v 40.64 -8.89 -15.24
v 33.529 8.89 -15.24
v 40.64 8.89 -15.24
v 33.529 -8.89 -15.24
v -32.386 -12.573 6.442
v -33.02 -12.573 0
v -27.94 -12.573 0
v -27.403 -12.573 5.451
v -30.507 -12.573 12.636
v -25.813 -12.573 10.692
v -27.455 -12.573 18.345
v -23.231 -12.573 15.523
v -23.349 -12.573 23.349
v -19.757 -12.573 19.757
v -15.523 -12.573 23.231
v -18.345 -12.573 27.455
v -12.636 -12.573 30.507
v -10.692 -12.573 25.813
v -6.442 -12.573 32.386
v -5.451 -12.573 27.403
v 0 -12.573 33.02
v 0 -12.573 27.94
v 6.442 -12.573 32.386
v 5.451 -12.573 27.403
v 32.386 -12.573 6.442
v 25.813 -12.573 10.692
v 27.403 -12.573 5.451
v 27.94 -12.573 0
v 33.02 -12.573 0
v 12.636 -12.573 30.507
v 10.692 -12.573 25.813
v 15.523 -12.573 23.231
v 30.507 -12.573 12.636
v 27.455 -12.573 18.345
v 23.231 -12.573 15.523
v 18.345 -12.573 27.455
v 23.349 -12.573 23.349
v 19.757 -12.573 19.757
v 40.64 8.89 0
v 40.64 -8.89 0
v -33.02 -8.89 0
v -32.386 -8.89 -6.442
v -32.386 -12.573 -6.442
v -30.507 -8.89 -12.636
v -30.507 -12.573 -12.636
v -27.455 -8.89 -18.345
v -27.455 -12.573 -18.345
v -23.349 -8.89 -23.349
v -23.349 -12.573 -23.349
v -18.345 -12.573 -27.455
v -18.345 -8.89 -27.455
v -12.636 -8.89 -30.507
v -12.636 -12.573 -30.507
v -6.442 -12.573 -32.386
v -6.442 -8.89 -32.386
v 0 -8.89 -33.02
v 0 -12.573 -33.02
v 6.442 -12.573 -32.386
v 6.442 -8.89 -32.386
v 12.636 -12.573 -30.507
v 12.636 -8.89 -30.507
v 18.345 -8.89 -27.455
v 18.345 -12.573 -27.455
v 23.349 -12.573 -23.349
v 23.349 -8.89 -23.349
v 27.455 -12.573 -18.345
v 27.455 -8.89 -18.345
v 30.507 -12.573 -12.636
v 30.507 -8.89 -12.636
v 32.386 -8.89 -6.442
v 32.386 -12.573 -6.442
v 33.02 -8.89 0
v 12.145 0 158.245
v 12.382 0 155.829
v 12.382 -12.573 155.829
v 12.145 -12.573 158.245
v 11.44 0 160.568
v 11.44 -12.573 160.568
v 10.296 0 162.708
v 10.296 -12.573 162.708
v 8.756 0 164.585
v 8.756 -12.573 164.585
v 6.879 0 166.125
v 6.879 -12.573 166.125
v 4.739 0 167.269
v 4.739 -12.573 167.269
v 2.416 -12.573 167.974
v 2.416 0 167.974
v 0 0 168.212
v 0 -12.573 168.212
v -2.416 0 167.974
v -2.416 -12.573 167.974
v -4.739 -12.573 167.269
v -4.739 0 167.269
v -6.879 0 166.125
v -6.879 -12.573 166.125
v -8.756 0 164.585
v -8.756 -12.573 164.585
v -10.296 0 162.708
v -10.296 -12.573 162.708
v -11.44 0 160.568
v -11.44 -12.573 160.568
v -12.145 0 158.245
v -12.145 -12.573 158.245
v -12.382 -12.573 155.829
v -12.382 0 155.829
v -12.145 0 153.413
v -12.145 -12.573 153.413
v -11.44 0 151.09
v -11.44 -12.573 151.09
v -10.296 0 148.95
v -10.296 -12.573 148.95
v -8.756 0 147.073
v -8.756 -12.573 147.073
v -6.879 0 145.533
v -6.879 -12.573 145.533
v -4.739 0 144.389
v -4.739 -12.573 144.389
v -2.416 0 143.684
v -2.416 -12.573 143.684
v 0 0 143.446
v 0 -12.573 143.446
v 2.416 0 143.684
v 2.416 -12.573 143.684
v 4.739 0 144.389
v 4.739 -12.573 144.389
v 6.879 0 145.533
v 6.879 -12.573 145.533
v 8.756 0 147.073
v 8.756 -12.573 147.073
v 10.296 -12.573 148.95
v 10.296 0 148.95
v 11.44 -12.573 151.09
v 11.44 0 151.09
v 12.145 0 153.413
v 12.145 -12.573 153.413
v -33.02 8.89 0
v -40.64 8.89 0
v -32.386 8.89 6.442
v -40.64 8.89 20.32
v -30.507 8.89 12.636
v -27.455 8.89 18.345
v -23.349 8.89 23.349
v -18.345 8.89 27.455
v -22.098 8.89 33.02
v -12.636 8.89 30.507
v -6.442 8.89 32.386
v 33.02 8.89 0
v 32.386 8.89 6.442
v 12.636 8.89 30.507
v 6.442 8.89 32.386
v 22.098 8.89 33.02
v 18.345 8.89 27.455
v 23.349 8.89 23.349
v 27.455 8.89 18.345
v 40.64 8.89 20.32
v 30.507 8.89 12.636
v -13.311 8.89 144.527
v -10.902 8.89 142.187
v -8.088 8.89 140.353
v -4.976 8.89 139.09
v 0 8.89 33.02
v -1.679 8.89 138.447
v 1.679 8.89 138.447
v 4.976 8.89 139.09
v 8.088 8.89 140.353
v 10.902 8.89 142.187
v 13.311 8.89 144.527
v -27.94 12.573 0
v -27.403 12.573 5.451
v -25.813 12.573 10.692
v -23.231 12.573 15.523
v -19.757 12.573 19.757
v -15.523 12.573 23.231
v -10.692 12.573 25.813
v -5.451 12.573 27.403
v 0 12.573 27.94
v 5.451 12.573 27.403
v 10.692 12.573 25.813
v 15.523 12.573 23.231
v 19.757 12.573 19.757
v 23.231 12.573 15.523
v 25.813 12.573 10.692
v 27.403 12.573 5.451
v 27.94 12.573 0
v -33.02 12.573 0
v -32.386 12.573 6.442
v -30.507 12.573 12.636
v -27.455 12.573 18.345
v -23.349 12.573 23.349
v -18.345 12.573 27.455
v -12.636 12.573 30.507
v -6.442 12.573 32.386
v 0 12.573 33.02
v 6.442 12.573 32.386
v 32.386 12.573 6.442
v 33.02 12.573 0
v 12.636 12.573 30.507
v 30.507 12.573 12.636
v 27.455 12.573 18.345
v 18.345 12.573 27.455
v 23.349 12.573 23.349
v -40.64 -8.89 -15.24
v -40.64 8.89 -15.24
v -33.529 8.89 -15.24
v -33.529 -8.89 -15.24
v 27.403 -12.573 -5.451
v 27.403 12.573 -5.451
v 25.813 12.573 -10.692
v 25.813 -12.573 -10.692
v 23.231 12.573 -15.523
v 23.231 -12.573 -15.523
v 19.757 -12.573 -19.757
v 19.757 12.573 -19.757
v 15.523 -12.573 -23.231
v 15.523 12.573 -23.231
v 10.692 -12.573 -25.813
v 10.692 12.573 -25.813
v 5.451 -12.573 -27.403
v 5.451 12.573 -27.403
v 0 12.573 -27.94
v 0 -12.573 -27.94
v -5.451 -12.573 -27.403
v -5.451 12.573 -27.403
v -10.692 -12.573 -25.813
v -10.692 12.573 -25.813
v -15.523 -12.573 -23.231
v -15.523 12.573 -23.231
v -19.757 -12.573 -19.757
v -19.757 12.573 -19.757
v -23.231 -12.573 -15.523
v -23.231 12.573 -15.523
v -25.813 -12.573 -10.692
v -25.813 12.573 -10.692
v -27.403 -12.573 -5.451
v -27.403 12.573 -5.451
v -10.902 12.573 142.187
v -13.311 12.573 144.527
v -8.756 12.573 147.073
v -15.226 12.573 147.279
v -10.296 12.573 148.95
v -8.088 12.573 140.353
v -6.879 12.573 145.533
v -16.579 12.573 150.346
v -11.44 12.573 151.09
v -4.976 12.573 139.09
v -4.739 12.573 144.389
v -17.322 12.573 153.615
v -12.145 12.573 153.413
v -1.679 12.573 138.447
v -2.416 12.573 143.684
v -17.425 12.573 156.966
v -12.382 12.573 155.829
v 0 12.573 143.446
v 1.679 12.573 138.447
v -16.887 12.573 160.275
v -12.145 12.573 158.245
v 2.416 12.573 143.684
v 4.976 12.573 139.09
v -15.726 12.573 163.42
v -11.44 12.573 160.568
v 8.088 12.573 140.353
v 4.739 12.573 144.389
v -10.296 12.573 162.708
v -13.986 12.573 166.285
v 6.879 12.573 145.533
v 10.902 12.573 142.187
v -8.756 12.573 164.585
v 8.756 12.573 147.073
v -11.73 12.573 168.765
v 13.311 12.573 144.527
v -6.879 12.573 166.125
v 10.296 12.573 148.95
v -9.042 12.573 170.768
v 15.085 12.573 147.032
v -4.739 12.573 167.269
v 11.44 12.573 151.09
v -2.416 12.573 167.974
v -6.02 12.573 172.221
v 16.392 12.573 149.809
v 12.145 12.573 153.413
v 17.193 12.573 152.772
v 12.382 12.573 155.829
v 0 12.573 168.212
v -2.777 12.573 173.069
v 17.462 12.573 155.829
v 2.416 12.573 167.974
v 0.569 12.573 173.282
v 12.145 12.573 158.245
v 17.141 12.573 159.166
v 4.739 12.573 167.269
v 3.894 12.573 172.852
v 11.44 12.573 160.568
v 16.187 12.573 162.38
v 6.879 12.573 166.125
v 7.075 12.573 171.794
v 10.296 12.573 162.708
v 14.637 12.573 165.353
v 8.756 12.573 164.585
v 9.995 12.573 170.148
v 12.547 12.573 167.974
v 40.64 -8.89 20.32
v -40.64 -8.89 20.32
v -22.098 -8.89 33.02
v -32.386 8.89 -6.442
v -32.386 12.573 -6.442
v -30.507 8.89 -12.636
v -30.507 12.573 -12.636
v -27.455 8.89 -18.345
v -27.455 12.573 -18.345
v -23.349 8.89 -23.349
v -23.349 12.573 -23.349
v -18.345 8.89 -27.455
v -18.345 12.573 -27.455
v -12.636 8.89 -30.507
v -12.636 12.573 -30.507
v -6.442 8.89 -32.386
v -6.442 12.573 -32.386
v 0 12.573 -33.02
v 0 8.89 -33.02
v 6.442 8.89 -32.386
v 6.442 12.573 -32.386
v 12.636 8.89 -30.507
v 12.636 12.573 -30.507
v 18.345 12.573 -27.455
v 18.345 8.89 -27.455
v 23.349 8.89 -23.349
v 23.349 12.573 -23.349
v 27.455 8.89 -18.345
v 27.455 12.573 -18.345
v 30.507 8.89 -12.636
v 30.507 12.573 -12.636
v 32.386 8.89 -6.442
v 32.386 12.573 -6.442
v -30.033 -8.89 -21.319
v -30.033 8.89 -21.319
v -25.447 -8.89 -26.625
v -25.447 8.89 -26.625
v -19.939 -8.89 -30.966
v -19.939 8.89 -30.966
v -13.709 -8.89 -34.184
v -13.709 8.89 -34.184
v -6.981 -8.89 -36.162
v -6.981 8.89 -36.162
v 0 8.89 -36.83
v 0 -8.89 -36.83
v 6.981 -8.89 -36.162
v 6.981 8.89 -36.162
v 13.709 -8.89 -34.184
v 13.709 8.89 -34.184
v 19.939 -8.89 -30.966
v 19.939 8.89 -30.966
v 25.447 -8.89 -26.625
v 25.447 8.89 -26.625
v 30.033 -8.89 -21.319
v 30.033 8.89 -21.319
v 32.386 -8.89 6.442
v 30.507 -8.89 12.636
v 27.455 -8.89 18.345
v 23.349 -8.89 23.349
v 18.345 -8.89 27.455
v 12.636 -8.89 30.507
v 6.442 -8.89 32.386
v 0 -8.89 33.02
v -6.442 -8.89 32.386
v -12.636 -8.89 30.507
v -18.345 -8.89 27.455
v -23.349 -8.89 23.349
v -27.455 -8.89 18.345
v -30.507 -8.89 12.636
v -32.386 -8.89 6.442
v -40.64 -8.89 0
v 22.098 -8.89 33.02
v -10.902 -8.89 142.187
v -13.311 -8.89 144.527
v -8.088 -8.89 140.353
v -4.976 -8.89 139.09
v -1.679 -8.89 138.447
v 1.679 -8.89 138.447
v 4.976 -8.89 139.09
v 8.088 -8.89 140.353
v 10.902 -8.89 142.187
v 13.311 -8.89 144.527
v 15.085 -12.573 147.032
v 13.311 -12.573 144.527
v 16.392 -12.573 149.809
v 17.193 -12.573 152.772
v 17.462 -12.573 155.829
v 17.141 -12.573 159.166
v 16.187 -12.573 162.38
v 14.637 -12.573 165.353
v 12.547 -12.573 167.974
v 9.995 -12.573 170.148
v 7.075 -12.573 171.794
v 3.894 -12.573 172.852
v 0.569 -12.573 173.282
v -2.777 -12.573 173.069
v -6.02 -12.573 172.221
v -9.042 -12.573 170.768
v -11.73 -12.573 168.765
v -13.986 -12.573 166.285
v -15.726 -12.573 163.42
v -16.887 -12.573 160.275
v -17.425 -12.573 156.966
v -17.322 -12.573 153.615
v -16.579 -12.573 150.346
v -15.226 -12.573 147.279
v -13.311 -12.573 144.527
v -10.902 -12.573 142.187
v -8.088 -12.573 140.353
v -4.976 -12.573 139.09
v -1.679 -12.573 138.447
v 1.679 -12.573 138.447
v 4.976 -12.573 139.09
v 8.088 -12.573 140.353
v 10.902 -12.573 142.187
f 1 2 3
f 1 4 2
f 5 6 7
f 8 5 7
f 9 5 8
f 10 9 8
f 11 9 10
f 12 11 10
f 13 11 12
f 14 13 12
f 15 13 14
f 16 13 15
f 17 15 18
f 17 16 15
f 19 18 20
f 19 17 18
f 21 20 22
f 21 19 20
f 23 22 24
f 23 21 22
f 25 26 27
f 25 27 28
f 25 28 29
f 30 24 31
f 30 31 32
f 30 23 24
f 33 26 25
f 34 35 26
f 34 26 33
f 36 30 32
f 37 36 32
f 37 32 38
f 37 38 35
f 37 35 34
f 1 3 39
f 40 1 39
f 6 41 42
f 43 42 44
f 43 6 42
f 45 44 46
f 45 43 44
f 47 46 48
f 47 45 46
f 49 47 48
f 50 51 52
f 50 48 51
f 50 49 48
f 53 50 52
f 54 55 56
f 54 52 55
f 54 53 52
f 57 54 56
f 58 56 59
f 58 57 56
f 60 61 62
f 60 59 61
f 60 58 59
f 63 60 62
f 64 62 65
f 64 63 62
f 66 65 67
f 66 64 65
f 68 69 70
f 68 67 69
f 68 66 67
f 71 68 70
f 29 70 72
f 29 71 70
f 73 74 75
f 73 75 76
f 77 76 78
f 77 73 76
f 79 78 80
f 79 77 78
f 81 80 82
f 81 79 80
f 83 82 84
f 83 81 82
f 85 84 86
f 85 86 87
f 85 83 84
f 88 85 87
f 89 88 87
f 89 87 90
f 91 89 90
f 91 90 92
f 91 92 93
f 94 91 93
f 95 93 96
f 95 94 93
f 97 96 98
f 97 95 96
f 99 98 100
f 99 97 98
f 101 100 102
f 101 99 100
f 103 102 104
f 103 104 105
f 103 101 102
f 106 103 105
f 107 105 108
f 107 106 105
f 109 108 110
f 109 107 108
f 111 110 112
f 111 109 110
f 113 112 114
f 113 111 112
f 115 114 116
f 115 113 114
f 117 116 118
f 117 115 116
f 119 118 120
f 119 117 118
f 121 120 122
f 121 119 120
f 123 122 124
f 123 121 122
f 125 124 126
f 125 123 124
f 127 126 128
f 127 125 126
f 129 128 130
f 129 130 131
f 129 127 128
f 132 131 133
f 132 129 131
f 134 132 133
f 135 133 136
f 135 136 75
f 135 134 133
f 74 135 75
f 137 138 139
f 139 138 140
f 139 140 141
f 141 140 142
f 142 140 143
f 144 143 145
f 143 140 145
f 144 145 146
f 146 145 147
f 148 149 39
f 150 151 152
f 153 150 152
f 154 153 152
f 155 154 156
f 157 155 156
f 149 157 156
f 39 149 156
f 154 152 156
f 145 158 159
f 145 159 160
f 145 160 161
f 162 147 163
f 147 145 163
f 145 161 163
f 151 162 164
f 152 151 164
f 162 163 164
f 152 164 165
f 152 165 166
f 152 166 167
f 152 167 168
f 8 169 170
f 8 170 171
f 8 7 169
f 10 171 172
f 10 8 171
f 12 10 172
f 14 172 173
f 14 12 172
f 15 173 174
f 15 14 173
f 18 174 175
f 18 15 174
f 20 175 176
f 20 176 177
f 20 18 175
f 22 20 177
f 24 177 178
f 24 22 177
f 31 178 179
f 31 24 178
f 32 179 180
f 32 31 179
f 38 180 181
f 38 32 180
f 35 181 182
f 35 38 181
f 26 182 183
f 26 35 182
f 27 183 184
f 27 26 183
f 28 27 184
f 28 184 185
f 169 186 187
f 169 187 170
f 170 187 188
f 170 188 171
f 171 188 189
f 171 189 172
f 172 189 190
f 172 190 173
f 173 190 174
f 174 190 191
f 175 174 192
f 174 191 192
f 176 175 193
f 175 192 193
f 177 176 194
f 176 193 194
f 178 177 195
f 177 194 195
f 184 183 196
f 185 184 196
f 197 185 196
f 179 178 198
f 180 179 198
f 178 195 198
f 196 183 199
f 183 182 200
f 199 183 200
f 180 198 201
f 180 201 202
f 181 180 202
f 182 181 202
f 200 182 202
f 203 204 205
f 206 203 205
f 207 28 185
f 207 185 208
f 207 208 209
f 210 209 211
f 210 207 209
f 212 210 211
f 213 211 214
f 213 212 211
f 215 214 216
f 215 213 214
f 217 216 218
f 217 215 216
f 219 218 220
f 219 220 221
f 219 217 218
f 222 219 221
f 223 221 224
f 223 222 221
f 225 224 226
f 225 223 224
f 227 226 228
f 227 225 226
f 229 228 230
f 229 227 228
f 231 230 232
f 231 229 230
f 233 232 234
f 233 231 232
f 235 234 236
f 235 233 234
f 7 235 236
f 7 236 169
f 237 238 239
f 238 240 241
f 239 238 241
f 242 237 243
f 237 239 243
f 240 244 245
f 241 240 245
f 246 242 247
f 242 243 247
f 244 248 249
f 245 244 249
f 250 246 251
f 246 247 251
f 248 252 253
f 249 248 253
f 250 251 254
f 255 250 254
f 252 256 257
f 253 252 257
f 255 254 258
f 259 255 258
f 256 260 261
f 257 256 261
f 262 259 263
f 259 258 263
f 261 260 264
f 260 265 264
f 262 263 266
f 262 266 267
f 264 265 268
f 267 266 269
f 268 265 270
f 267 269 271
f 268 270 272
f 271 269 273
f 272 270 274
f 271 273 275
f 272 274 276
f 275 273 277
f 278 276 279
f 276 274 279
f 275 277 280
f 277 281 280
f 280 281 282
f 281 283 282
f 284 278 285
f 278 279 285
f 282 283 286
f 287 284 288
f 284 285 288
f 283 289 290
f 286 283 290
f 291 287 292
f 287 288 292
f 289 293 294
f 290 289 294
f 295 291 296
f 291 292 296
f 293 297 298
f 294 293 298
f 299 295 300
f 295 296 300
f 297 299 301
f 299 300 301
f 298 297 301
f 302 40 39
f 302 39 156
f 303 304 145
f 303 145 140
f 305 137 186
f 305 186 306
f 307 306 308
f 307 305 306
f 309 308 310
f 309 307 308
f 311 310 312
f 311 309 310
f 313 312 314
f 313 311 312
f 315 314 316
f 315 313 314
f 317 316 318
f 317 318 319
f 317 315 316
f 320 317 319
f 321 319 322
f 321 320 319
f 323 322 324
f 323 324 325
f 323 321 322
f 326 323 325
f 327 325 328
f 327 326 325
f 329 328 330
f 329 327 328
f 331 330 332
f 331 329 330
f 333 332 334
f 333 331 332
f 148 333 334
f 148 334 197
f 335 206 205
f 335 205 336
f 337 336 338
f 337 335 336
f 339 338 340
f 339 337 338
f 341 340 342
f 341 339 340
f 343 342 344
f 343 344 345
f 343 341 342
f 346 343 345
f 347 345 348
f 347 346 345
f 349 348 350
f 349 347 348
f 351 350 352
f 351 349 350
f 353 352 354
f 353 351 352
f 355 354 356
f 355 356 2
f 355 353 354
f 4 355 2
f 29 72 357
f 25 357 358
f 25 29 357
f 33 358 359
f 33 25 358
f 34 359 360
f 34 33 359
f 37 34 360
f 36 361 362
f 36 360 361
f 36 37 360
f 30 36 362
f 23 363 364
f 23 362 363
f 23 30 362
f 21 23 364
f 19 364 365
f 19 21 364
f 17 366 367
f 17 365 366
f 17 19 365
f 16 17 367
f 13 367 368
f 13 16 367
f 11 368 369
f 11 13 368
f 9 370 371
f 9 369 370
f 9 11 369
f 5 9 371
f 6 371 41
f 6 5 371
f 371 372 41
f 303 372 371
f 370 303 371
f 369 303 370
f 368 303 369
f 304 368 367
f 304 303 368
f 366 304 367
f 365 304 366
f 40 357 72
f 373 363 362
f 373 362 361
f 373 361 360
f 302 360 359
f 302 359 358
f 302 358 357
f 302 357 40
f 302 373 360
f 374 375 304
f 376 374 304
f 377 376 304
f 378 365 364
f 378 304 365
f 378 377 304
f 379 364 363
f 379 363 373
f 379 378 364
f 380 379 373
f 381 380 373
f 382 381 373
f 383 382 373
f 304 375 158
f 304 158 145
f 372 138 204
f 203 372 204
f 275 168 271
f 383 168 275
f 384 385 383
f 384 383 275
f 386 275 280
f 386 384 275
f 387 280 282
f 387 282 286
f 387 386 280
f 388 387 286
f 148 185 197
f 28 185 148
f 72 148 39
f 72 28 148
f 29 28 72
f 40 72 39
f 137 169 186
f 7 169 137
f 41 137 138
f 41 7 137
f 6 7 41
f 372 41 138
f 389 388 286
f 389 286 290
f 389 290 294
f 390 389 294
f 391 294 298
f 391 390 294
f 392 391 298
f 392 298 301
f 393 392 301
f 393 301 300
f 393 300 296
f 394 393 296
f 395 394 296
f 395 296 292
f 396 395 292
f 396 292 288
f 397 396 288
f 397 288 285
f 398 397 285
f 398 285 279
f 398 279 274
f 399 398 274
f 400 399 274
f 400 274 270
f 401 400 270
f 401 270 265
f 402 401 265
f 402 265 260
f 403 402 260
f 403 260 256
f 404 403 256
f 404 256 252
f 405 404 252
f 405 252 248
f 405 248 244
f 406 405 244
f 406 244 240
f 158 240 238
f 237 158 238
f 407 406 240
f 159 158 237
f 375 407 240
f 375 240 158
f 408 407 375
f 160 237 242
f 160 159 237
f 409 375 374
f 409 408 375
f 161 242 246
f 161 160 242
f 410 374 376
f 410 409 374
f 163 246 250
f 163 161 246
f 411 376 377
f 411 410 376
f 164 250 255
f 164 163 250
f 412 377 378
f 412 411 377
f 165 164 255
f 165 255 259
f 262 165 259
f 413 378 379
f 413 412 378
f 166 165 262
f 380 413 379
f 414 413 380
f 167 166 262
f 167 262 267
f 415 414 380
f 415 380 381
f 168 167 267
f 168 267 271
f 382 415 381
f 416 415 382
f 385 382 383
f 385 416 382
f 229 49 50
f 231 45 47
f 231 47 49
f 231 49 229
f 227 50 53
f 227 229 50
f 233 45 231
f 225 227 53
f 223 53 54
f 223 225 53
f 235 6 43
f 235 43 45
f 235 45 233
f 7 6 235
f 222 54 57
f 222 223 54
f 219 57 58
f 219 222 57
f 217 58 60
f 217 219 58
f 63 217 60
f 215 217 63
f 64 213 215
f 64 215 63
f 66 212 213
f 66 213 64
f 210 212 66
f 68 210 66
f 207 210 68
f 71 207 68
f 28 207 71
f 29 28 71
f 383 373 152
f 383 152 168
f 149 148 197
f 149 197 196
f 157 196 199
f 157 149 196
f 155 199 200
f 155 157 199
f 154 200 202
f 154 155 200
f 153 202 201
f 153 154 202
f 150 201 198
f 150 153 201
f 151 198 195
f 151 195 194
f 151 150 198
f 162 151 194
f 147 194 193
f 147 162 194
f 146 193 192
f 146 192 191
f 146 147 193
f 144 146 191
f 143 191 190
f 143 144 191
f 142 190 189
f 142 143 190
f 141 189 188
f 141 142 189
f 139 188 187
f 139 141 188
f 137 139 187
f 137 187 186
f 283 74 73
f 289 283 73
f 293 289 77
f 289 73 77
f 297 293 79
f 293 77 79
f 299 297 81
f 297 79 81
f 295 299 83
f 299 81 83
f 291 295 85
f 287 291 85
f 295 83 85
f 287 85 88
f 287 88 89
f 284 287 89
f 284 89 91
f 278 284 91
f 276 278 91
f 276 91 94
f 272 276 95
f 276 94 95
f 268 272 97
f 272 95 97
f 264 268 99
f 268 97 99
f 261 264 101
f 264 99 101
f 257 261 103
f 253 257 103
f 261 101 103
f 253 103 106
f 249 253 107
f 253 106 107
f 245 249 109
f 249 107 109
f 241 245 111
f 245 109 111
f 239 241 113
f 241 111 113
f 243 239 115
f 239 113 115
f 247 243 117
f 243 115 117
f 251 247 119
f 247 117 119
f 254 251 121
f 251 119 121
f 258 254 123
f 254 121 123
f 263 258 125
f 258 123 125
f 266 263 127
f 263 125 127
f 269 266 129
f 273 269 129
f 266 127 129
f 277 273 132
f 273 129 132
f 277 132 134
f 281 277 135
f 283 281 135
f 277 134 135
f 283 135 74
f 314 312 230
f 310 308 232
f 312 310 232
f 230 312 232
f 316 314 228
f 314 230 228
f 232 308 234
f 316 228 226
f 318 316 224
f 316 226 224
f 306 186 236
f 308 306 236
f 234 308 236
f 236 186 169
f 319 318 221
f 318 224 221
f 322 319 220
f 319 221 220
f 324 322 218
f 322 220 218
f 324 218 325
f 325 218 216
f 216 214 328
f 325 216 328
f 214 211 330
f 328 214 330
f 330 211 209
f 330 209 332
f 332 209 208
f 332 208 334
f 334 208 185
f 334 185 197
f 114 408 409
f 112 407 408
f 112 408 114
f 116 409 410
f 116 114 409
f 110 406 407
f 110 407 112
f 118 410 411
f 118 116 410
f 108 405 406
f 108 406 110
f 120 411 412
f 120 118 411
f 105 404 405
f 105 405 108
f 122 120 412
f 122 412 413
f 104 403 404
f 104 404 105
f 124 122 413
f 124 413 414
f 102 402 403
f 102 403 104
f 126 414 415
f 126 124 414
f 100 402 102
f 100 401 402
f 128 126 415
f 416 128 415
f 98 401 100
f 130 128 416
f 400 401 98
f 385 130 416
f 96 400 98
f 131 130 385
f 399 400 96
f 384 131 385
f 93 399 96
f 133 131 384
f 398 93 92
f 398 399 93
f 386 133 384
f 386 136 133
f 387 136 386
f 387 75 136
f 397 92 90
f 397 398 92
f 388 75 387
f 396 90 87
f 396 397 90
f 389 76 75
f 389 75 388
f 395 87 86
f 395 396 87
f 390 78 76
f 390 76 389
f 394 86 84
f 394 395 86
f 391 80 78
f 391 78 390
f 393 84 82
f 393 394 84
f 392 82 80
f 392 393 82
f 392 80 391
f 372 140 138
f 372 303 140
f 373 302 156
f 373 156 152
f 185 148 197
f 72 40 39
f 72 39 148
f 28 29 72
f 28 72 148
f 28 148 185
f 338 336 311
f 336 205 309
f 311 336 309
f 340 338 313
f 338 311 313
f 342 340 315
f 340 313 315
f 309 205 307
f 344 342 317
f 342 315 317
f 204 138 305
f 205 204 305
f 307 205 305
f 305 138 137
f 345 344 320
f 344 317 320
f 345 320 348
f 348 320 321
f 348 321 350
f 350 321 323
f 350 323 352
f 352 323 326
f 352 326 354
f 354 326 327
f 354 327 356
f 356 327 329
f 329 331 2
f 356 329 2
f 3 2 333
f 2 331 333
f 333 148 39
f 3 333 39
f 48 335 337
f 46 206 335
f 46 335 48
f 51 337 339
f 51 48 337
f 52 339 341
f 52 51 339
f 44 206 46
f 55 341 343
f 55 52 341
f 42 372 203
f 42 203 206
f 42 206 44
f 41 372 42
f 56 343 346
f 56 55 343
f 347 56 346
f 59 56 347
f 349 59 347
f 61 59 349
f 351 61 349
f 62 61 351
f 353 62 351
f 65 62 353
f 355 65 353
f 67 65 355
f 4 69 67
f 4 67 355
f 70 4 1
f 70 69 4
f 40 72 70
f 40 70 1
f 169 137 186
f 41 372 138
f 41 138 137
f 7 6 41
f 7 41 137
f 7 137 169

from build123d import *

# Parameters (mm, degrees)
F1_DEPTH = 12.573
F2_DEPTH = 8.89
F0_R     = 12.3825
F3_DEPTH = 12.573
F4_DEPTH = 12.573
F5_DEPTH = 8.89


with BuildPart() as f1:
    # F0 (on Front) → F1 (new body, symmetric)
    with BuildSketch(Plane.XZ):
        with BuildLine():
            ThreePointArc((-27.94, 0), (0, 27.94), (27.94, 0))
            Line((27.94, 0), (33.02, 0))
            ThreePointArc((33.02, 0), (0, 33.02), (-33.02, 0))
            Line((-33.02, 0), (-27.94, 0))
        make_face()
    extrude(amount=F1_DEPTH, both=True)

    # F0 (on Front) → F2 (join, symmetric)
    with BuildSketch(Plane.XZ):
        with BuildLine():
            ThreePointArc((-33.02, 0), (0, 33.02), (33.02, 0))
            Line((33.02, 0), (40.64, 0))
            Line((40.64, 0), (40.64, 20.32))
            Line((40.64, 20.32), (22.098, 33.02))
            Line((22.098, 33.02), (13.3114870458, 144.5266454276))
            ThreePointArc((13.3114870458, 144.5266454276), (0, 138.3665), (-13.3114870458, 144.5266454276))
            Line((-13.3114870458, 144.5266454276), (-22.098, 33.02))
            Line((-22.098, 33.02), (-40.64, 20.32))
            Line((-40.64, 20.32), (-40.64, 0))
            Line((-40.64, 0), (-33.02, 0))
        make_face()
    extrude(amount=F2_DEPTH, both=True)

    # F0 (on Front) → F3 (join, symmetric)
    with BuildSketch(Plane.XZ):
        with BuildLine():
            ThreePointArc((-13.3114870458, 144.5266454276), (0, 138.3665), (13.3114870458, 144.5266454276))
            ThreePointArc((13.3114870458, 144.5266454276), (16.3919301607, 149.8087398847), (17.4625, 155.829))
            ThreePointArc((17.4625, 155.829), (-6.0202601153, 172.2209301607), (-13.3114870458, 144.5266454276))
        make_face()
        with Locations((0, 155.829)):
            Circle(F0_R, mode=Mode.SUBTRACT)
    extrude(amount=F3_DEPTH, both=True)


with BuildPart() as f4:
    # F0 (on Front) → F4 (new body, symmetric)
    with BuildSketch(Plane.XZ):
        with BuildLine():
            Line((33.02, 0), (27.94, 0))
            ThreePointArc((27.94, 0), (0, -27.94), (-27.94, 0))
            Line((-27.94, 0), (-33.02, 0))
            ThreePointArc((-33.02, 0), (0, -33.02), (33.02, 0))
        make_face()
    extrude(amount=F4_DEPTH, both=True)

    # F0 (on Front) → F5 (join, symmetric)
    with BuildSketch(Plane.XZ):
        with BuildLine():
            Line((40.64, 0), (33.02, 0))
            ThreePointArc((33.02, 0), (0, -33.02), (-33.02, 0))
            Line((-33.02, 0), (-40.64, 0))
            Line((-40.64, 0), (-40.64, -15.24))
            Line((-40.64, -15.24), (-33.5289621074, -15.24))
            ThreePointArc((-33.5289621074, -15.24), (0, -36.83), (33.5289621074, -15.24))
            Line((33.5289621074, -15.24), (40.64, -15.24))
            Line((40.64, -15.24), (40.64, 0))
        make_face()
    extrude(amount=F5_DEPTH, both=True)


solid = Compound([f1.part, f4.part])
